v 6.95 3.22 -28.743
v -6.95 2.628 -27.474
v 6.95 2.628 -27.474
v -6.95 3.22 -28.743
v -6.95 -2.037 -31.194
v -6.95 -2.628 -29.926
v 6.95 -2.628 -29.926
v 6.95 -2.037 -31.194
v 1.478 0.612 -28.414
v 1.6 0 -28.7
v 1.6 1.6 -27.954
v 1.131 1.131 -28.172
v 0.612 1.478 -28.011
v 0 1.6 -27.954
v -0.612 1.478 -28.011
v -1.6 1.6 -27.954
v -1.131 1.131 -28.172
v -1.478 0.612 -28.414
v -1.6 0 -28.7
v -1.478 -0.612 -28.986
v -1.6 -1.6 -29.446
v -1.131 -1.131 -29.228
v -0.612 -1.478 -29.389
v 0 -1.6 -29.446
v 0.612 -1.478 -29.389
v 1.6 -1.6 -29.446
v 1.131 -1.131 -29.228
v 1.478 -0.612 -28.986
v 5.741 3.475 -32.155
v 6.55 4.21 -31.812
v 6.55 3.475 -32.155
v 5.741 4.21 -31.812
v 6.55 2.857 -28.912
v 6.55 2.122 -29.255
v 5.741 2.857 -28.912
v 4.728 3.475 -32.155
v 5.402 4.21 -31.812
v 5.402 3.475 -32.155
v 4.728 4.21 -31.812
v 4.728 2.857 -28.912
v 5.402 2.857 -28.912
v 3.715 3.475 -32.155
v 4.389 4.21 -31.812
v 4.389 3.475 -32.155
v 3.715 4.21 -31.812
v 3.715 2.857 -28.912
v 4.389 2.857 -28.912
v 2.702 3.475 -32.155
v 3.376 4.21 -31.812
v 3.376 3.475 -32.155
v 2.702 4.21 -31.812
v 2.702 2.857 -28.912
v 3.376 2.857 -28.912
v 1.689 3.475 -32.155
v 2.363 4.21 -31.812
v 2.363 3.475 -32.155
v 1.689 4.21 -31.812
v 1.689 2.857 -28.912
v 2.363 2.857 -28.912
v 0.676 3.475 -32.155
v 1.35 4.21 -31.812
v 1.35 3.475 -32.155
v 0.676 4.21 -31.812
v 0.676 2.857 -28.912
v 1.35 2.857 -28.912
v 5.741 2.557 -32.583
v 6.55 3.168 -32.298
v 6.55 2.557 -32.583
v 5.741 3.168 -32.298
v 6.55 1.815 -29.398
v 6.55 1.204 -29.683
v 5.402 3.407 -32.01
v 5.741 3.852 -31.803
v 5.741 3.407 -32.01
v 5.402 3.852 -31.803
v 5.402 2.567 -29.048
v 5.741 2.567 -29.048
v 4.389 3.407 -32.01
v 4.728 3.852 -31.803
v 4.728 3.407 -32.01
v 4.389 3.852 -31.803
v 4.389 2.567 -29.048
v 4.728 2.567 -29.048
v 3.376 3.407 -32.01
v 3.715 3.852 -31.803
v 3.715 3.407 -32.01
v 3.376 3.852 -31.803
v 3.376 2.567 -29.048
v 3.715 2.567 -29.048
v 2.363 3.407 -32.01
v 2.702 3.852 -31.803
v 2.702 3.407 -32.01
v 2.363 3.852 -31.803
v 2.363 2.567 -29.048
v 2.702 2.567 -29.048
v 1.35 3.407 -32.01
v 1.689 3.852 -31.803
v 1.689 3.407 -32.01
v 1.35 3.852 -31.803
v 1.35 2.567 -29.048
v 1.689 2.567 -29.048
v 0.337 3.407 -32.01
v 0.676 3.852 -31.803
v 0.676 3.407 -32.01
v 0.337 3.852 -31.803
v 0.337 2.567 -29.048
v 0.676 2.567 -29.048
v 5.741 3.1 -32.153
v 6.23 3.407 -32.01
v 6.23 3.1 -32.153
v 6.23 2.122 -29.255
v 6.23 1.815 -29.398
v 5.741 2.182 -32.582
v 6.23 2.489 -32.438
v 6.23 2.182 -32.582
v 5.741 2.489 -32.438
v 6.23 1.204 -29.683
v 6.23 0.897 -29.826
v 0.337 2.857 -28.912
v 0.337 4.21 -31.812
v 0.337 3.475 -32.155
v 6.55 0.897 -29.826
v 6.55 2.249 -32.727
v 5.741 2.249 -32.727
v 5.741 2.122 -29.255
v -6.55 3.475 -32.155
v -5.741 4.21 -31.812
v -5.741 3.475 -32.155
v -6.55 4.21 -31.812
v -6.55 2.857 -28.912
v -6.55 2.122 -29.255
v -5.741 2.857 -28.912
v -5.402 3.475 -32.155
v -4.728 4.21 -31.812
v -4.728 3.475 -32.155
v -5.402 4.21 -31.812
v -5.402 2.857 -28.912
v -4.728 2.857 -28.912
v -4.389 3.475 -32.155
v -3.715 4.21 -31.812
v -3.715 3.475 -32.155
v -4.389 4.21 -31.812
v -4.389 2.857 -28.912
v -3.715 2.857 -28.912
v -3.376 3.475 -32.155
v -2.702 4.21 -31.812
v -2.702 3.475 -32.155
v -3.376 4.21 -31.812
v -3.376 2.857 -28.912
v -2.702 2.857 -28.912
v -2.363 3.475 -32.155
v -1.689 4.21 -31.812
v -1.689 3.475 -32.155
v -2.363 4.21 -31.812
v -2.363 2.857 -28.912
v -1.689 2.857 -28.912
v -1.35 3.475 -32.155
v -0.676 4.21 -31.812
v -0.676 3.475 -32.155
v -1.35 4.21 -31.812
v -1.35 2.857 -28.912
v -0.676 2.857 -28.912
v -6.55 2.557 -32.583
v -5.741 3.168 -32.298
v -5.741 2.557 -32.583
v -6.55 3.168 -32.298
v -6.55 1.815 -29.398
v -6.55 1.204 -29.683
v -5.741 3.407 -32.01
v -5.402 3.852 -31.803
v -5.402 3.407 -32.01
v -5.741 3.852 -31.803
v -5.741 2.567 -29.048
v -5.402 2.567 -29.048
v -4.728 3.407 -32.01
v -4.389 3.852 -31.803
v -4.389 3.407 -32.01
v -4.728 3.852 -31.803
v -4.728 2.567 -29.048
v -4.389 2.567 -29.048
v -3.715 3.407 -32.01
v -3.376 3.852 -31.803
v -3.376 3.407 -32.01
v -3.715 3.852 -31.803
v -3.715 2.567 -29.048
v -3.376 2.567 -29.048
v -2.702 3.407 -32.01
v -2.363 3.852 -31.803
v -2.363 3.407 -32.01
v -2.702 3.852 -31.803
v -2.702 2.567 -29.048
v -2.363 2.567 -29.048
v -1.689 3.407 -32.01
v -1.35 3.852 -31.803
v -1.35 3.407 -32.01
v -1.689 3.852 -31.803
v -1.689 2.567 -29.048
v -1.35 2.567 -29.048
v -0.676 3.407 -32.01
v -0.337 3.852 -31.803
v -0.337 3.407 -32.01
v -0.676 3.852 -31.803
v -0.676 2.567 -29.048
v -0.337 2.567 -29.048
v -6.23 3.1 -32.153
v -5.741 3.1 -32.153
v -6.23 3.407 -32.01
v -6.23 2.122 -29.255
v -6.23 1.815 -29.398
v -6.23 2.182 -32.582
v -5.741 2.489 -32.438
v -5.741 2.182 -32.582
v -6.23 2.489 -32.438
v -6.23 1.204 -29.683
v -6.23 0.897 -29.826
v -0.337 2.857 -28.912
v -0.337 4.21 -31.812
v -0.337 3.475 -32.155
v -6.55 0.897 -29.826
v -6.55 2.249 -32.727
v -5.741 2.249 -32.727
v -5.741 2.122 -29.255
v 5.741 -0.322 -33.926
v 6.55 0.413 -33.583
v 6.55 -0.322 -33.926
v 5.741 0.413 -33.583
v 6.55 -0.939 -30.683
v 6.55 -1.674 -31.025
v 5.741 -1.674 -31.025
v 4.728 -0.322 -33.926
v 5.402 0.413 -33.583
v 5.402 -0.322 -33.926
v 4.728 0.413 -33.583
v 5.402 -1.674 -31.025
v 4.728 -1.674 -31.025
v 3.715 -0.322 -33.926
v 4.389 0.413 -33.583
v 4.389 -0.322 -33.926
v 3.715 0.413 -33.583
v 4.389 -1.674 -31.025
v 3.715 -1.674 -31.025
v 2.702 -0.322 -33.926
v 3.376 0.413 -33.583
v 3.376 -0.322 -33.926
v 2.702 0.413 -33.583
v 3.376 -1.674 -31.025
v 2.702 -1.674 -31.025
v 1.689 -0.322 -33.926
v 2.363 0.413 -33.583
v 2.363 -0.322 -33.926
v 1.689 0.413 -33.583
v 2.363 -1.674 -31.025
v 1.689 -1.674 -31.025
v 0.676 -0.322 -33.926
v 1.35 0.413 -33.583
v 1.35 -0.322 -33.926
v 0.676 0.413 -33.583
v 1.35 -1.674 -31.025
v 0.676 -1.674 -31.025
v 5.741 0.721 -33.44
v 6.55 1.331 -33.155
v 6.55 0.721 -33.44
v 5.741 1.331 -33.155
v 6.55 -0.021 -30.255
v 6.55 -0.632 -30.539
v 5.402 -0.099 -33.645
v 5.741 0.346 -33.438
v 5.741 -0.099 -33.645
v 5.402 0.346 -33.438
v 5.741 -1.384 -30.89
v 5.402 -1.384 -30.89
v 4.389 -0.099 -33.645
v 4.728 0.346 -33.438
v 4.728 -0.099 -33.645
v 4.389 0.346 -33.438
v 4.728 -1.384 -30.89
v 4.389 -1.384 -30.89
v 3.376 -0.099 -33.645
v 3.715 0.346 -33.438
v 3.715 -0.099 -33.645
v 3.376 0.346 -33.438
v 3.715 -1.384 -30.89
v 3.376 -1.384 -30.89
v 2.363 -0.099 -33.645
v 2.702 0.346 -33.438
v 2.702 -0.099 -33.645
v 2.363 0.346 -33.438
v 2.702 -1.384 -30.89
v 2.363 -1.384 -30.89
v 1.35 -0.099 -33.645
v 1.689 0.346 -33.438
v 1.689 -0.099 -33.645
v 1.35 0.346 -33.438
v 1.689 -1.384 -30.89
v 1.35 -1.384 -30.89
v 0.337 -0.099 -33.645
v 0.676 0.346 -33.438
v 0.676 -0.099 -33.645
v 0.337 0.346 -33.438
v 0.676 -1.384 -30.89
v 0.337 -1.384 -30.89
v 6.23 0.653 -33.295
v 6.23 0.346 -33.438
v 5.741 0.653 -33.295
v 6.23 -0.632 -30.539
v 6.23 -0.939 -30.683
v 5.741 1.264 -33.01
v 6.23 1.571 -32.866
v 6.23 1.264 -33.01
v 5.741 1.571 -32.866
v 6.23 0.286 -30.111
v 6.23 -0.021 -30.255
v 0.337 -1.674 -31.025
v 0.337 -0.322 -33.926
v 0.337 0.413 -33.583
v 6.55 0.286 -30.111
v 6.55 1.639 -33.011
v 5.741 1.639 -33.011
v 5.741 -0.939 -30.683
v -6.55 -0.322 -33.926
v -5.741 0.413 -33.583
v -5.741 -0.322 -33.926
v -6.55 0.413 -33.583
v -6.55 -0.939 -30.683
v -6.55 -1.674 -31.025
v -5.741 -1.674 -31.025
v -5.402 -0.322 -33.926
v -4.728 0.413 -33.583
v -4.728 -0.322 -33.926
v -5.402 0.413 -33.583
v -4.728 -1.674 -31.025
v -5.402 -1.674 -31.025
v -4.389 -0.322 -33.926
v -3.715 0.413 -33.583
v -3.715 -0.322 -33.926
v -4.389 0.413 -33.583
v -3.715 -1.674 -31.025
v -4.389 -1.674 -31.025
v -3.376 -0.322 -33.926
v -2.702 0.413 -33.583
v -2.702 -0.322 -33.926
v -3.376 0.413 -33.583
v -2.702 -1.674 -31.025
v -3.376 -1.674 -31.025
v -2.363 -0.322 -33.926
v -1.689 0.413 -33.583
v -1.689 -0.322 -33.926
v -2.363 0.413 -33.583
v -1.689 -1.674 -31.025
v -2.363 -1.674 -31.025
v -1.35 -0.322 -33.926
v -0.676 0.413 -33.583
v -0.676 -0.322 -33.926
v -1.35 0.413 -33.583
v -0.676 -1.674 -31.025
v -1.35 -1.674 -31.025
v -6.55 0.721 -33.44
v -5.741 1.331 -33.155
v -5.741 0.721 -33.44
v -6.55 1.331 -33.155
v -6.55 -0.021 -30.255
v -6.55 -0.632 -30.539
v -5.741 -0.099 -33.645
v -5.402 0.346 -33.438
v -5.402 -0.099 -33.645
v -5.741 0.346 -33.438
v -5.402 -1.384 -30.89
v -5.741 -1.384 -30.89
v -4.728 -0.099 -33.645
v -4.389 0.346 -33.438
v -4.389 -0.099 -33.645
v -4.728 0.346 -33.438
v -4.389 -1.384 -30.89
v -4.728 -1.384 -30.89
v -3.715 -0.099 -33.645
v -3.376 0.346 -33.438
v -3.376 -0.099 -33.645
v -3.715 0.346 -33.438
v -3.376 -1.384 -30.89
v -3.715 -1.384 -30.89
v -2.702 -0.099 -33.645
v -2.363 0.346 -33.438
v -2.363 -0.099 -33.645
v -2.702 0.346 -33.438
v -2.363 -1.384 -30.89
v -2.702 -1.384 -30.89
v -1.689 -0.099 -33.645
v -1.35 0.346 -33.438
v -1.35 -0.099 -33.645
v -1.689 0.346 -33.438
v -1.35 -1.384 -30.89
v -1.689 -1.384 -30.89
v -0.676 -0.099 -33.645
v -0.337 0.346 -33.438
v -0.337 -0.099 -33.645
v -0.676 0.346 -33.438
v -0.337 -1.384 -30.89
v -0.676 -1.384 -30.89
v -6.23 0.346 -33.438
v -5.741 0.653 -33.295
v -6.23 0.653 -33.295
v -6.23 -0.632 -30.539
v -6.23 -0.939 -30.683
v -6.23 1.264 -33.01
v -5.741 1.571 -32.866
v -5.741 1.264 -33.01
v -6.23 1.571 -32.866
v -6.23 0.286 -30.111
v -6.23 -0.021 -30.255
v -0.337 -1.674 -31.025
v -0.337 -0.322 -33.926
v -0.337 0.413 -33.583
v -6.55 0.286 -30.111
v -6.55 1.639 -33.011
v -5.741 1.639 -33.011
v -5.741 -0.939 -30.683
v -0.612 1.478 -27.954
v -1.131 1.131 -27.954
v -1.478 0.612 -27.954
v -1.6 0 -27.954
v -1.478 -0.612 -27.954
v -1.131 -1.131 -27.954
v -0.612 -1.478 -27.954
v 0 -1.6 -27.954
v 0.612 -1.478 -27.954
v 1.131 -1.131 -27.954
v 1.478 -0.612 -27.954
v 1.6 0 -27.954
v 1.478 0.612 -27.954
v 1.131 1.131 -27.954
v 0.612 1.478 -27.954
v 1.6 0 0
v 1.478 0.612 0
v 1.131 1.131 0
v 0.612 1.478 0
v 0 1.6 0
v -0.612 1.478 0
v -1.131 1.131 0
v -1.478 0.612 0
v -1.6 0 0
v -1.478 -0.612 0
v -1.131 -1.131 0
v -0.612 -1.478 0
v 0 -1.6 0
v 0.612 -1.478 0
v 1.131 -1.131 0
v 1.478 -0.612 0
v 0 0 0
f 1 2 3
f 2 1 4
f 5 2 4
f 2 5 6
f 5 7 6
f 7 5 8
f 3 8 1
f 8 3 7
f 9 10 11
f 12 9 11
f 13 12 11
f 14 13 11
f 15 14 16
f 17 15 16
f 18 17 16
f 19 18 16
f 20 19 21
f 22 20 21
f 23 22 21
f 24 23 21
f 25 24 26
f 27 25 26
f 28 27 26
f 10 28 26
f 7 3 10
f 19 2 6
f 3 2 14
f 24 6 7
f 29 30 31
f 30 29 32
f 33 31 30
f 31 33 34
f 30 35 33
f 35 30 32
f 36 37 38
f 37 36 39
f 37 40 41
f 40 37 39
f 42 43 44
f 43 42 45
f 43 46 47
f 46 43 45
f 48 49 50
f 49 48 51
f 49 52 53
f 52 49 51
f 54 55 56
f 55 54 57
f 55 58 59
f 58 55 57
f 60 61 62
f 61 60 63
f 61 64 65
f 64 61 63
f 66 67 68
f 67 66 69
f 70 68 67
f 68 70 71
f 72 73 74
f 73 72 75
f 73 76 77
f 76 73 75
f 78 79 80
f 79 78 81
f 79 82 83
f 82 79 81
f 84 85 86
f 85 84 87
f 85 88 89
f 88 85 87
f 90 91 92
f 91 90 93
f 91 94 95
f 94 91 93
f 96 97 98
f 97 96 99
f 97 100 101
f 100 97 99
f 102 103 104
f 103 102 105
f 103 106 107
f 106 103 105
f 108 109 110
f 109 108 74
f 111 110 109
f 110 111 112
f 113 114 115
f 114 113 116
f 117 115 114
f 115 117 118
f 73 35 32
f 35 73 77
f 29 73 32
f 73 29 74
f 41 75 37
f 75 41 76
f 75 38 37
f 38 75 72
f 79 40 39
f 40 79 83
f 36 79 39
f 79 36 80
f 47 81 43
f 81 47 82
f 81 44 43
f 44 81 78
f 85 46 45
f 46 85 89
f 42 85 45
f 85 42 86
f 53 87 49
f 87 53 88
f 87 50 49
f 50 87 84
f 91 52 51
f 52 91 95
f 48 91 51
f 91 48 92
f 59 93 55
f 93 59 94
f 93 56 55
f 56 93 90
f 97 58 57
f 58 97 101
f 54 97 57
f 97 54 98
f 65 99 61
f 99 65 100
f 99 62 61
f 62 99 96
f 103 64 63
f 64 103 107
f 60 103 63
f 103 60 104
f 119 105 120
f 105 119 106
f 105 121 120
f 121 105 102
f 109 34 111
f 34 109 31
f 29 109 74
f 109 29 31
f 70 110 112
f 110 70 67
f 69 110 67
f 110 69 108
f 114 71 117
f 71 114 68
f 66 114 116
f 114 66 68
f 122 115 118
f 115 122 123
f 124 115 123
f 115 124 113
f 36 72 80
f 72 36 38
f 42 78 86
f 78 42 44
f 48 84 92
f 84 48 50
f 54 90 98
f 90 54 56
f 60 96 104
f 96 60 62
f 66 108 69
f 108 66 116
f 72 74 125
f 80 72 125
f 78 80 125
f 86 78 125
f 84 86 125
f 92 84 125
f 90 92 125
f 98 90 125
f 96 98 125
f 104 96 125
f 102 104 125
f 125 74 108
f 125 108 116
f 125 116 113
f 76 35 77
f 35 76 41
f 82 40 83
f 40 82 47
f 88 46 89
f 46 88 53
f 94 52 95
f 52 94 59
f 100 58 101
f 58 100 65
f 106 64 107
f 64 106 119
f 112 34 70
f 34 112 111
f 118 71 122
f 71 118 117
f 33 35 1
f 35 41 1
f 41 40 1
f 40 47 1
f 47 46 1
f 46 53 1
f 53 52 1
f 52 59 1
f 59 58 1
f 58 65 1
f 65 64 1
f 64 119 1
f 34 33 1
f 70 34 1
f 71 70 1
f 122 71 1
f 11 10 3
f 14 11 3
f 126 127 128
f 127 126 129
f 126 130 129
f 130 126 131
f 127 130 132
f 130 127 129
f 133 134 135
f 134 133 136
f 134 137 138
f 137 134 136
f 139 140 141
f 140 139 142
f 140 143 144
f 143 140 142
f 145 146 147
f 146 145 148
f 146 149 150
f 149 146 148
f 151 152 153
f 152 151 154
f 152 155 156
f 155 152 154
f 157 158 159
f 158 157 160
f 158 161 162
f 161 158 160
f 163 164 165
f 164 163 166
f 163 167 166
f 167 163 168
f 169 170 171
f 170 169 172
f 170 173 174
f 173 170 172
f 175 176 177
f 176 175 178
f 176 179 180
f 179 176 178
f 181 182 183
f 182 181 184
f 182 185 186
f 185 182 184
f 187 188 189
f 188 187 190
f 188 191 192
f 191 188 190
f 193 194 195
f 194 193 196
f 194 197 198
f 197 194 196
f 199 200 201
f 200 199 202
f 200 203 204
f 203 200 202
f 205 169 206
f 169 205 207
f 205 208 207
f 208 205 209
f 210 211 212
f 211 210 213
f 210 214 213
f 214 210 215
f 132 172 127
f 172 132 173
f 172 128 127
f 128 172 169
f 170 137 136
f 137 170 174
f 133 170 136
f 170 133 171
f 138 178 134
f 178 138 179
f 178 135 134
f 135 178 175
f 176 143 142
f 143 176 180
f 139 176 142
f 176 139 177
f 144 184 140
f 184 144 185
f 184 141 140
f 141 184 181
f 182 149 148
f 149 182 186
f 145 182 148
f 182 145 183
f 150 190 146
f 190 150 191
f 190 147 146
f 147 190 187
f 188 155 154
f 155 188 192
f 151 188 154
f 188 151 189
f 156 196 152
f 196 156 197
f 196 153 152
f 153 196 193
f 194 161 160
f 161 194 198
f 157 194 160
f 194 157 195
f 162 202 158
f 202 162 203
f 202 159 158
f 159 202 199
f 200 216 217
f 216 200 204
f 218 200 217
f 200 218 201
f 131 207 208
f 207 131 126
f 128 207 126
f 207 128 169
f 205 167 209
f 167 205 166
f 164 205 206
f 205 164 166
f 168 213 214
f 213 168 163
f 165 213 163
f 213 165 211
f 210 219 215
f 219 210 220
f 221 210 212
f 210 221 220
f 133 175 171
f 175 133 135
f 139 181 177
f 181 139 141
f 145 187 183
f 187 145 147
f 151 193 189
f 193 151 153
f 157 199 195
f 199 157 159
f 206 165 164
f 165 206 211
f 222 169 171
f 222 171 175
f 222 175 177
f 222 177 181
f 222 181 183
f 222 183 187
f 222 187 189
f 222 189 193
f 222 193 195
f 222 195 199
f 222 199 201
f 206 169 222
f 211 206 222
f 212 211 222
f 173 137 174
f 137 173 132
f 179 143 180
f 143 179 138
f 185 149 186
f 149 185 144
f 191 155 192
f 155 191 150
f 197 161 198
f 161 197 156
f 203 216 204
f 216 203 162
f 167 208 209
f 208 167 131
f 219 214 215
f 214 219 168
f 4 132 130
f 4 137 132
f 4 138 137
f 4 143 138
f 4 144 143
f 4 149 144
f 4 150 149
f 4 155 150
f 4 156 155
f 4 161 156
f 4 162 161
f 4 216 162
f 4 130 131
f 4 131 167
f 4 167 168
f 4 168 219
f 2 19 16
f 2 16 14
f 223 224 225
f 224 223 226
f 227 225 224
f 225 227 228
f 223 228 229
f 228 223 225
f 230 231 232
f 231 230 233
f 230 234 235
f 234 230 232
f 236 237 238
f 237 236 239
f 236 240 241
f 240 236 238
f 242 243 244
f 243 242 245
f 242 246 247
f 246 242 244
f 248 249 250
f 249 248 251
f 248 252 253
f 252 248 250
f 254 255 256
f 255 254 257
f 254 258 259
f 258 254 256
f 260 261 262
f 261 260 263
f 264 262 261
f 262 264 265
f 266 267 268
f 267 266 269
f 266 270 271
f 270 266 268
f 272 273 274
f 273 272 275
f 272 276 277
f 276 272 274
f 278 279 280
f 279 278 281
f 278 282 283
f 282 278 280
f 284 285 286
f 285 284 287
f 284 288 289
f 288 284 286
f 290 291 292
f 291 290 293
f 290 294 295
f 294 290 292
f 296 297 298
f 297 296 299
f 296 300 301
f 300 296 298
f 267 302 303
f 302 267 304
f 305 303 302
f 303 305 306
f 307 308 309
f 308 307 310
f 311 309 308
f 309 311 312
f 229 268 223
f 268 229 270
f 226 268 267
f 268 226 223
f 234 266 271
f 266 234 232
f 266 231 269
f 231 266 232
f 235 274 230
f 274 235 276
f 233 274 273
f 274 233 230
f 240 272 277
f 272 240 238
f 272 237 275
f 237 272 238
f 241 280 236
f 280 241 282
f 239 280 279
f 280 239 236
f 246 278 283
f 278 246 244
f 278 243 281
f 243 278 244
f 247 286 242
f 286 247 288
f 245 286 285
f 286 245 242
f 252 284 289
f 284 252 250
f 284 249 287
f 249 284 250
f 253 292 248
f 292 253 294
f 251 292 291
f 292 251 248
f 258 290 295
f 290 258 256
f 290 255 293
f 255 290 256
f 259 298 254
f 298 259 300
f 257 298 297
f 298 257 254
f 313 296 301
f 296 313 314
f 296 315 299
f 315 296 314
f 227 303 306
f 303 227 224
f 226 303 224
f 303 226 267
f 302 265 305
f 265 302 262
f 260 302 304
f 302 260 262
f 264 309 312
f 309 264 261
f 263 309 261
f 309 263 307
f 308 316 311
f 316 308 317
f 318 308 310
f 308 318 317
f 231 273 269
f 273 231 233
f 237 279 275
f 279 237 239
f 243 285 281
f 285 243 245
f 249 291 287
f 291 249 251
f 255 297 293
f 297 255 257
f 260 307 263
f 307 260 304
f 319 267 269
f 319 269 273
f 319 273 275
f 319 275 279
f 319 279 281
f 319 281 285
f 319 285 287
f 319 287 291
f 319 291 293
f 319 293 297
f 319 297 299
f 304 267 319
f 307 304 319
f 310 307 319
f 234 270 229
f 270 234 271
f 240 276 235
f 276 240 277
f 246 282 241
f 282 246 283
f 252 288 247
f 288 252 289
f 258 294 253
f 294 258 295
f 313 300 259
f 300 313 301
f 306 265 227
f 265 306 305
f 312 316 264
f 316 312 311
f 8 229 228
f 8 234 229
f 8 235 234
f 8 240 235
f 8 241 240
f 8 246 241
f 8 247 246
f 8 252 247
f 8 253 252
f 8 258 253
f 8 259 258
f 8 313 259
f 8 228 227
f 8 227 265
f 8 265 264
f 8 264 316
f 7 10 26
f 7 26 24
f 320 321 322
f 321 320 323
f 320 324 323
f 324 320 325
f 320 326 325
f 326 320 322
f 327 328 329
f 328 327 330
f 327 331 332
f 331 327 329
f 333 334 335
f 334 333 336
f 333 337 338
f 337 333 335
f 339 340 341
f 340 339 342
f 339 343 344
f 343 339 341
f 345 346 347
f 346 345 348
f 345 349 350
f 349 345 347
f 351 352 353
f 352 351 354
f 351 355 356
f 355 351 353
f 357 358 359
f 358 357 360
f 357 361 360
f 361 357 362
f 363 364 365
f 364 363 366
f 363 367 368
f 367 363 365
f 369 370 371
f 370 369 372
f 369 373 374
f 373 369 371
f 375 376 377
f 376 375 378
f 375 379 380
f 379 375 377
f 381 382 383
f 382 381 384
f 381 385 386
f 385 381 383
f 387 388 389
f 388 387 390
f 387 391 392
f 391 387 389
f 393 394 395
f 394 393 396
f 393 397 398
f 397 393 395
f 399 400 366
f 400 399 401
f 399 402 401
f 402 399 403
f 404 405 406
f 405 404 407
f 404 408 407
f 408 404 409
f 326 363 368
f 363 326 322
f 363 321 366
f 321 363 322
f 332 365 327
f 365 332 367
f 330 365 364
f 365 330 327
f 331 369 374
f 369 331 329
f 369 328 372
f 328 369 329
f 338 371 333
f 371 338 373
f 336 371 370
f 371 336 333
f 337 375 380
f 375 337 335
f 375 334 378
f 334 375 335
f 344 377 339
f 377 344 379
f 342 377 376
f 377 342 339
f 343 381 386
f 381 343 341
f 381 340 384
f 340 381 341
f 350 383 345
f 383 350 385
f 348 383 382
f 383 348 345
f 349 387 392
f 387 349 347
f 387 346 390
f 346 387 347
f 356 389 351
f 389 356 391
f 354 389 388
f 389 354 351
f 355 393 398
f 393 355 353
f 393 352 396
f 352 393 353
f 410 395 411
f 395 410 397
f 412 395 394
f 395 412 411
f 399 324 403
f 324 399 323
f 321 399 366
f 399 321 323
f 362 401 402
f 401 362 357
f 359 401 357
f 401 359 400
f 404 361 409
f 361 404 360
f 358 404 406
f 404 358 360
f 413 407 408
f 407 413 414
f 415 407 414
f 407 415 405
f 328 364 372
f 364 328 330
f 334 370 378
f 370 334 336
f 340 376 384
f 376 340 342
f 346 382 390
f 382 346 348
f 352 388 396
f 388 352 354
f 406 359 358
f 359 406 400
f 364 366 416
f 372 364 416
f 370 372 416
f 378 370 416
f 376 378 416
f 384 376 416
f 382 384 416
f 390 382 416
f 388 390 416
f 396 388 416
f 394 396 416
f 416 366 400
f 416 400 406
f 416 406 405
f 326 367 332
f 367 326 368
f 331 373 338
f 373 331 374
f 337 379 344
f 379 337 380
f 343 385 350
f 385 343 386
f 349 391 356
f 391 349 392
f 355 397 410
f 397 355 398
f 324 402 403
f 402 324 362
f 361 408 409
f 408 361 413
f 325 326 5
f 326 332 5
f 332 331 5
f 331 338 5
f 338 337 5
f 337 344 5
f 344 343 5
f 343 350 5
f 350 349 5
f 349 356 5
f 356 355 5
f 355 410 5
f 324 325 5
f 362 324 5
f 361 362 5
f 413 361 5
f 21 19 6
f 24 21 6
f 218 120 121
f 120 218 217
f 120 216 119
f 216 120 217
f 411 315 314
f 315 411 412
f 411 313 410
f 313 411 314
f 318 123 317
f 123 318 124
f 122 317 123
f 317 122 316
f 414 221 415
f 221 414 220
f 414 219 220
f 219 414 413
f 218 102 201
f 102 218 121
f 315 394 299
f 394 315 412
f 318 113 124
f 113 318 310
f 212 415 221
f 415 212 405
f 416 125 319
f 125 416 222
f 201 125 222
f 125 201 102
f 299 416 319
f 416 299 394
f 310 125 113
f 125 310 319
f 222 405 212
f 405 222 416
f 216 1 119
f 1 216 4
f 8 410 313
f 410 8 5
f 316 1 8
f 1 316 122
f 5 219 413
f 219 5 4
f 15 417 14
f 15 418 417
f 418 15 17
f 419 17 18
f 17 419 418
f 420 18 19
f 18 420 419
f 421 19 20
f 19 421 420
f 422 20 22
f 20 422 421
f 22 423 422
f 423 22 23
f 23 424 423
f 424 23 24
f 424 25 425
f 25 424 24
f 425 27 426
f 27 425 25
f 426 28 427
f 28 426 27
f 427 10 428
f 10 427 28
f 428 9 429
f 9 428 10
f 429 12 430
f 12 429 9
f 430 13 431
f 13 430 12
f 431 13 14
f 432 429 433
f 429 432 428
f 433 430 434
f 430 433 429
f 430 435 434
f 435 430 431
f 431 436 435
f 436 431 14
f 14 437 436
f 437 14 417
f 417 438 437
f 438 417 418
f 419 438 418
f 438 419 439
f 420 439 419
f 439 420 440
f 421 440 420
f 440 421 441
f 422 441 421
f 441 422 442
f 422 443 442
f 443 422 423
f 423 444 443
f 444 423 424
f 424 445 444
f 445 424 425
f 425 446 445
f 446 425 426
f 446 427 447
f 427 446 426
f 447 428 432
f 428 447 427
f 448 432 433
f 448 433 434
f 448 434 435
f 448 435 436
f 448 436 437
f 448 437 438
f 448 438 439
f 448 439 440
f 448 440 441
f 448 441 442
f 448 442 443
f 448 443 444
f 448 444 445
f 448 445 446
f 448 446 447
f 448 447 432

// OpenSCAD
use <../lib.scad>
use <../p/4-4cyli.scad>
use <../p/4-4cylse.scad>
use <../p/4-4disc.scad>
use <../p/4-4edge.scad>
use <../p/4-4ndis.scad>
use <../p/box2-5.scad>
use <../p/box4.scad>
use <../p/rect.scad>
use <../p/rect2p.scad>
use <s/3836s01.scad>
$fa=1; $fs=0.2;
function ldraw_lib__3836(realsolid=false) = [
// 0 Minifig Pushbroom
// 0 Name: 3836.dat
// 0 Author: Imre Papp [ampi]
// 0 !LDRAW_ORG Part UPDATE 2014-02
// 0 !LICENSE Licensed under CC BY 2.0 and CC BY 4.0 : see CAreadme.txt
// 
// 0 !HELP To place on Y=0 plane in working position : turn X: -25 then move Y: -76.528
// 
// 0 BFC CERTIFY CCW
  [0,"BFC","CERTIFY"],
  [0,"BFC","CCW"],
// 
// 0 !CATEGORY Minifig Accessory
// 0 !KEYWORDS broom, tool
// 
// 0 !HISTORY 2000-09-30 [PTadmin] Official Update 2000-02
// 0 !HISTORY 2007-10-12 [PTadmin] Header formatted for Contributor Agreement
// 0 !HISTORY 2008-07-01 [PTadmin] Official Update 2008-01
// 0 !HISTORY 2008-07-07 [jriley] cleaned up broom/handle intersection; BFC compliant (2003-06-08)
// 0 !HISTORY 2008-07-08 [fwcain] added CMDLINE meta-statement; fixed bristles (2003-09-22)
// 0 !HISTORY 2013-06-26 [MMR1988] rewritten from the scratch, removed CMDLINE
// 0 !HISTORY 2014-12-23 [PTadmin] Official Update 2014-02
// 
// 
// 0 // Broom
// 
// 1 16 0 71.75 0 17.375 0 0 0 3.17208 -3.06398 0 1.47916 6.57073 box4.dat
  [1,16,0,71.75,0,17.375,0,0,0,3.17208,-3.06398,0,1.47916,6.57073, ldraw_lib__box4(realsolid)],
// 
// 1 16 0 71.75 0 4 0 0 0 0.90631 -1.86523 0 0.42262 4 4-4ndis.dat
  [1,16,0,71.75,0,4,0,0,0,0.90631,-1.86523,0,0.42262,4, ldraw_lib__4_4ndis(realsolid)],
// 
// 3 16 17.375 74.81398 -6.57073 17.375 68.68602 6.57073 4 71.75 0
  [3,16,17.375,74.81398,-6.57073,17.375,68.68602,6.57073,4,71.75,0],
// 3 16 -4 71.75 0 -17.375 68.68602 6.57073 -17.375 74.81398 -6.57073
  [3,16,-4,71.75,0,-17.375,68.68602,6.57073,-17.375,74.81398,-6.57073],
// 3 16 17.375 68.68602 6.57073 -17.375 68.68602 6.57073 0 69.88477 4
  [3,16,17.375,68.68602,6.57073,-17.375,68.68602,6.57073,0,69.88477,4],
// 3 16 0 73.61523 -4 -17.375 74.81398 -6.57073 17.375 74.81398 -6.57073
  [3,16,0,73.61523,-4,-17.375,74.81398,-6.57073,17.375,74.81398,-6.57073],
// 
// 1 16 0 71.75 0 1 0 0 0 0.90631 -0.42262 0 0.42262 0.90631 s\3836s01.dat
  [1,16,0,71.75,0,1,0,0,0,0.90631,-0.42262,0,0.42262,0.90631, ldraw_lib__s__3836s01(realsolid)],
// 1 16 0 71.75 0 -1 0 0 0 0.90631 -0.42262 0 0.42262 0.90631 s\3836s01.dat
  [1,16,0,71.75,0,-1,0,0,0,0.90631,-0.42262,0,0.42262,0.90631, ldraw_lib__s__3836s01(realsolid)],
// 1 16 0 71.75 0 1 0 0 0 0.90631 0.42262 0 0.42262 -0.90631 s\3836s01.dat
  [1,16,0,71.75,0,1,0,0,0,0.90631,0.42262,0,0.42262,-0.90631, ldraw_lib__s__3836s01(realsolid)],
// 1 16 0 71.75 0 -1 0 0 0 0.90631 0.42262 0 0.42262 -0.90631 s\3836s01.dat
  [1,16,0,71.75,0,-1,0,0,0,0.90631,0.42262,0,0.42262,-0.90631, ldraw_lib__s__3836s01(realsolid)],
// 
// 1 16 0 76.33437 7.91529 0.8425 0 0 0 3.62523 -0.42843 0 1.69047 0.91877 box2-5.dat
  [1,16,0,76.33437,7.91529,0.8425,0,0,0,3.62523,-0.42843,0,1.69047,0.91877, ldraw_lib__box2_5(realsolid)],
// 1 16 0 80.76024 -1.57602 0.8425 0 0 0 3.62523 0.42843 0 1.69047 -0.91877 box2-5.dat
  [1,16,0,80.76024,-1.57602,0.8425,0,0,0,3.62523,0.42843,0,1.69047,-0.91877, ldraw_lib__box2_5(realsolid)],
// 1 16 15.3638 78.54731 3.16964 0 0 1.01125 -0.35606 3.62523 0 0.76356 1.69047 0 box2-5.dat
  [1,16,15.3638,78.54731,3.16964,0,0,1.01125,-0.35606,3.62523,0,0.76356,1.69047,0, ldraw_lib__box2_5(realsolid)],
// 1 16 -15.3638 78.54731 3.16964 0 0 -1.01125 -0.35606 3.62523 0 0.76356 1.69047 0 box2-5.dat
  [1,16,-15.3638,78.54731,3.16964,0,0,-1.01125,-0.35606,3.62523,0,0.76356,1.69047,0, ldraw_lib__box2_5(realsolid)],
// 1 16 0 80.20677 8.60247 0 0 -0.8425 -0.18126 -0.42262 0 -0.08452 0.90631 0 rect2p.dat
  [1,16,0,80.20677,8.60247,0,0,-0.8425,-0.18126,-0.42262,0,-0.08452,0.90631,0, ldraw_lib__rect2p(realsolid)],
// 1 16 0 83.77578 0.9487 0 0 -0.8425 -0.18126 0.42262 0 -0.08452 -0.90631 0 rect2p.dat
  [1,16,0,83.77578,0.9487,0,0,-0.8425,-0.18126,0.42262,0,-0.08452,-0.90631,0, ldraw_lib__rect2p(realsolid)],
// 1 16 14.3525 81.99128 4.77559 0 1 0 -0.18126 0 0.35606 -0.08452 0 -0.76356 rect2p.dat
  [1,16,14.3525,81.99128,4.77559,0,1,0,-0.18126,0,0.35606,-0.08452,0,-0.76356, ldraw_lib__rect2p(realsolid)],
// 1 16 -14.3525 81.99128 4.77559 0 -1 0 -0.18126 0 0.35606 -0.08452 0 -0.76356 rect2p.dat
  [1,16,-14.3525,81.99128,4.77559,0,-1,0,-0.18126,0,0.35606,-0.08452,0,-0.76356, ldraw_lib__rect2p(realsolid)],
// 
// 1 16 0 74.92208 1.47916 0 0 -14.3525 1.78451 -0.90631 0 -3.82688 -0.42262 0 rect.dat
  [1,16,0,74.92208,1.47916,0,0,-14.3525,1.78451,-0.90631,0,-3.82688,-0.42262,0, ldraw_lib__rect(realsolid)],
// 
// 4 16 0.8425 80.02551 8.51795 14.3525 73.13757 5.30605 -14.3525 73.13757 5.30605 -0.8425 80.02551 8.51795
  [4,16,0.8425,80.02551,8.51795,14.3525,73.13757,5.30605,-14.3525,73.13757,5.30605,-0.8425,80.02551,8.51795],
// 4 16 -0.8425 83.59452 0.86418 -14.3525 76.70658 -2.34772 14.3525 76.70658 -2.34772 0.8425 83.59452 0.86418
  [4,16,-0.8425,83.59452,0.86418,-14.3525,76.70658,-2.34772,14.3525,76.70658,-2.34772,0.8425,83.59452,0.86418],
// 4 16 14.3525 73.13757 5.30605 14.3525 81.45396 5.45463 14.3525 82.16607 3.9275 14.3525 76.70658 -2.34772
  [4,16,14.3525,73.13757,5.30605,14.3525,81.45396,5.45463,14.3525,82.16607,3.9275,14.3525,76.70658,-2.34772],
// 4 16 -14.3525 76.70658 -2.34772 -14.3525 82.16607 3.9275 -14.3525 81.45396 5.45463 -14.3525 73.13757 5.30605
  [4,16,-14.3525,76.70658,-2.34772,-14.3525,82.16607,3.9275,-14.3525,81.45396,5.45463,-14.3525,73.13757,5.30605],
// 
// 4 16 -0.8425 72.28071 7.14359 -17.375 71.85809 8.0499 17.375 71.85809 8.0499 0.8425 72.28071 7.14359
  [4,16,-0.8425,72.28071,7.14359,-17.375,71.85809,8.0499,17.375,71.85809,8.0499,0.8425,72.28071,7.14359],
// 4 16 0.8425 77.56344 -4.18526 17.375 77.98606 -5.09157 -17.375 77.98606 -5.09157 -0.8425 77.56344 -4.18526
  [4,16,0.8425,77.56344,-4.18526,17.375,77.98606,-5.09157,-17.375,77.98606,-5.09157,-0.8425,77.56344,-4.18526],
// 4 16 16.37505 74.566 2.24277 17.375 71.85809 8.0499 17.375 77.98606 -5.09157 16.37505 75.27815 0.71555
  [4,16,16.37505,74.566,2.24277,17.375,71.85809,8.0499,17.375,77.98606,-5.09157,16.37505,75.27815,0.71555],
// 4 16 -16.37505 75.27815 0.71555 -17.375 77.98606 -5.09157 -17.375 71.85809 8.0499 -16.37505 74.566 2.24277
  [4,16,-16.37505,75.27815,0.71555,-17.375,77.98606,-5.09157,-17.375,71.85809,8.0499,-16.37505,74.566,2.24277],
// 
// 0 // handle
// 
// 1 16 0 69.88478 0 0 0 -4 0 1.86521 0 4 0 0 4-4cylse.dat
  [1,16,0,69.88478,0,0,0,-4,0,1.86521,0,4,0,0, ldraw_lib__4_4cylse(realsolid)],
// 1 16 0 0 0 4 0 0 0 69.88478 0 0 0 4 4-4cyli.dat
  [1,16,0,0,0,4,0,0,0,69.88478,0,0,0,4, ldraw_lib__4_4cyli(realsolid)],
// 1 16 0 0 0 4 0 0 0 1 0 0 0 4 4-4disc.dat
  [1,16,0,0,0,4,0,0,0,1,0,0,0,4, ldraw_lib__4_4disc(realsolid)],
// 1 16 0 0 0 4 0 0 0 1 0 0 0 4 4-4edge.dat
  [1,16,0,0,0,4,0,0,0,1,0,0,0,4, ldraw_lib__4_4edge(realsolid)],
];
module ldraw_lib__3836(step=0, col=false, unit=2/5, alt=false, line=0.2, solid=!$preview)
    makepoly(ldraw_lib__3836(solid), step=step, col=col, unit=unit, alt=alt, line=line, solid=solid);
ldraw_lib__3836(line=0.2);
